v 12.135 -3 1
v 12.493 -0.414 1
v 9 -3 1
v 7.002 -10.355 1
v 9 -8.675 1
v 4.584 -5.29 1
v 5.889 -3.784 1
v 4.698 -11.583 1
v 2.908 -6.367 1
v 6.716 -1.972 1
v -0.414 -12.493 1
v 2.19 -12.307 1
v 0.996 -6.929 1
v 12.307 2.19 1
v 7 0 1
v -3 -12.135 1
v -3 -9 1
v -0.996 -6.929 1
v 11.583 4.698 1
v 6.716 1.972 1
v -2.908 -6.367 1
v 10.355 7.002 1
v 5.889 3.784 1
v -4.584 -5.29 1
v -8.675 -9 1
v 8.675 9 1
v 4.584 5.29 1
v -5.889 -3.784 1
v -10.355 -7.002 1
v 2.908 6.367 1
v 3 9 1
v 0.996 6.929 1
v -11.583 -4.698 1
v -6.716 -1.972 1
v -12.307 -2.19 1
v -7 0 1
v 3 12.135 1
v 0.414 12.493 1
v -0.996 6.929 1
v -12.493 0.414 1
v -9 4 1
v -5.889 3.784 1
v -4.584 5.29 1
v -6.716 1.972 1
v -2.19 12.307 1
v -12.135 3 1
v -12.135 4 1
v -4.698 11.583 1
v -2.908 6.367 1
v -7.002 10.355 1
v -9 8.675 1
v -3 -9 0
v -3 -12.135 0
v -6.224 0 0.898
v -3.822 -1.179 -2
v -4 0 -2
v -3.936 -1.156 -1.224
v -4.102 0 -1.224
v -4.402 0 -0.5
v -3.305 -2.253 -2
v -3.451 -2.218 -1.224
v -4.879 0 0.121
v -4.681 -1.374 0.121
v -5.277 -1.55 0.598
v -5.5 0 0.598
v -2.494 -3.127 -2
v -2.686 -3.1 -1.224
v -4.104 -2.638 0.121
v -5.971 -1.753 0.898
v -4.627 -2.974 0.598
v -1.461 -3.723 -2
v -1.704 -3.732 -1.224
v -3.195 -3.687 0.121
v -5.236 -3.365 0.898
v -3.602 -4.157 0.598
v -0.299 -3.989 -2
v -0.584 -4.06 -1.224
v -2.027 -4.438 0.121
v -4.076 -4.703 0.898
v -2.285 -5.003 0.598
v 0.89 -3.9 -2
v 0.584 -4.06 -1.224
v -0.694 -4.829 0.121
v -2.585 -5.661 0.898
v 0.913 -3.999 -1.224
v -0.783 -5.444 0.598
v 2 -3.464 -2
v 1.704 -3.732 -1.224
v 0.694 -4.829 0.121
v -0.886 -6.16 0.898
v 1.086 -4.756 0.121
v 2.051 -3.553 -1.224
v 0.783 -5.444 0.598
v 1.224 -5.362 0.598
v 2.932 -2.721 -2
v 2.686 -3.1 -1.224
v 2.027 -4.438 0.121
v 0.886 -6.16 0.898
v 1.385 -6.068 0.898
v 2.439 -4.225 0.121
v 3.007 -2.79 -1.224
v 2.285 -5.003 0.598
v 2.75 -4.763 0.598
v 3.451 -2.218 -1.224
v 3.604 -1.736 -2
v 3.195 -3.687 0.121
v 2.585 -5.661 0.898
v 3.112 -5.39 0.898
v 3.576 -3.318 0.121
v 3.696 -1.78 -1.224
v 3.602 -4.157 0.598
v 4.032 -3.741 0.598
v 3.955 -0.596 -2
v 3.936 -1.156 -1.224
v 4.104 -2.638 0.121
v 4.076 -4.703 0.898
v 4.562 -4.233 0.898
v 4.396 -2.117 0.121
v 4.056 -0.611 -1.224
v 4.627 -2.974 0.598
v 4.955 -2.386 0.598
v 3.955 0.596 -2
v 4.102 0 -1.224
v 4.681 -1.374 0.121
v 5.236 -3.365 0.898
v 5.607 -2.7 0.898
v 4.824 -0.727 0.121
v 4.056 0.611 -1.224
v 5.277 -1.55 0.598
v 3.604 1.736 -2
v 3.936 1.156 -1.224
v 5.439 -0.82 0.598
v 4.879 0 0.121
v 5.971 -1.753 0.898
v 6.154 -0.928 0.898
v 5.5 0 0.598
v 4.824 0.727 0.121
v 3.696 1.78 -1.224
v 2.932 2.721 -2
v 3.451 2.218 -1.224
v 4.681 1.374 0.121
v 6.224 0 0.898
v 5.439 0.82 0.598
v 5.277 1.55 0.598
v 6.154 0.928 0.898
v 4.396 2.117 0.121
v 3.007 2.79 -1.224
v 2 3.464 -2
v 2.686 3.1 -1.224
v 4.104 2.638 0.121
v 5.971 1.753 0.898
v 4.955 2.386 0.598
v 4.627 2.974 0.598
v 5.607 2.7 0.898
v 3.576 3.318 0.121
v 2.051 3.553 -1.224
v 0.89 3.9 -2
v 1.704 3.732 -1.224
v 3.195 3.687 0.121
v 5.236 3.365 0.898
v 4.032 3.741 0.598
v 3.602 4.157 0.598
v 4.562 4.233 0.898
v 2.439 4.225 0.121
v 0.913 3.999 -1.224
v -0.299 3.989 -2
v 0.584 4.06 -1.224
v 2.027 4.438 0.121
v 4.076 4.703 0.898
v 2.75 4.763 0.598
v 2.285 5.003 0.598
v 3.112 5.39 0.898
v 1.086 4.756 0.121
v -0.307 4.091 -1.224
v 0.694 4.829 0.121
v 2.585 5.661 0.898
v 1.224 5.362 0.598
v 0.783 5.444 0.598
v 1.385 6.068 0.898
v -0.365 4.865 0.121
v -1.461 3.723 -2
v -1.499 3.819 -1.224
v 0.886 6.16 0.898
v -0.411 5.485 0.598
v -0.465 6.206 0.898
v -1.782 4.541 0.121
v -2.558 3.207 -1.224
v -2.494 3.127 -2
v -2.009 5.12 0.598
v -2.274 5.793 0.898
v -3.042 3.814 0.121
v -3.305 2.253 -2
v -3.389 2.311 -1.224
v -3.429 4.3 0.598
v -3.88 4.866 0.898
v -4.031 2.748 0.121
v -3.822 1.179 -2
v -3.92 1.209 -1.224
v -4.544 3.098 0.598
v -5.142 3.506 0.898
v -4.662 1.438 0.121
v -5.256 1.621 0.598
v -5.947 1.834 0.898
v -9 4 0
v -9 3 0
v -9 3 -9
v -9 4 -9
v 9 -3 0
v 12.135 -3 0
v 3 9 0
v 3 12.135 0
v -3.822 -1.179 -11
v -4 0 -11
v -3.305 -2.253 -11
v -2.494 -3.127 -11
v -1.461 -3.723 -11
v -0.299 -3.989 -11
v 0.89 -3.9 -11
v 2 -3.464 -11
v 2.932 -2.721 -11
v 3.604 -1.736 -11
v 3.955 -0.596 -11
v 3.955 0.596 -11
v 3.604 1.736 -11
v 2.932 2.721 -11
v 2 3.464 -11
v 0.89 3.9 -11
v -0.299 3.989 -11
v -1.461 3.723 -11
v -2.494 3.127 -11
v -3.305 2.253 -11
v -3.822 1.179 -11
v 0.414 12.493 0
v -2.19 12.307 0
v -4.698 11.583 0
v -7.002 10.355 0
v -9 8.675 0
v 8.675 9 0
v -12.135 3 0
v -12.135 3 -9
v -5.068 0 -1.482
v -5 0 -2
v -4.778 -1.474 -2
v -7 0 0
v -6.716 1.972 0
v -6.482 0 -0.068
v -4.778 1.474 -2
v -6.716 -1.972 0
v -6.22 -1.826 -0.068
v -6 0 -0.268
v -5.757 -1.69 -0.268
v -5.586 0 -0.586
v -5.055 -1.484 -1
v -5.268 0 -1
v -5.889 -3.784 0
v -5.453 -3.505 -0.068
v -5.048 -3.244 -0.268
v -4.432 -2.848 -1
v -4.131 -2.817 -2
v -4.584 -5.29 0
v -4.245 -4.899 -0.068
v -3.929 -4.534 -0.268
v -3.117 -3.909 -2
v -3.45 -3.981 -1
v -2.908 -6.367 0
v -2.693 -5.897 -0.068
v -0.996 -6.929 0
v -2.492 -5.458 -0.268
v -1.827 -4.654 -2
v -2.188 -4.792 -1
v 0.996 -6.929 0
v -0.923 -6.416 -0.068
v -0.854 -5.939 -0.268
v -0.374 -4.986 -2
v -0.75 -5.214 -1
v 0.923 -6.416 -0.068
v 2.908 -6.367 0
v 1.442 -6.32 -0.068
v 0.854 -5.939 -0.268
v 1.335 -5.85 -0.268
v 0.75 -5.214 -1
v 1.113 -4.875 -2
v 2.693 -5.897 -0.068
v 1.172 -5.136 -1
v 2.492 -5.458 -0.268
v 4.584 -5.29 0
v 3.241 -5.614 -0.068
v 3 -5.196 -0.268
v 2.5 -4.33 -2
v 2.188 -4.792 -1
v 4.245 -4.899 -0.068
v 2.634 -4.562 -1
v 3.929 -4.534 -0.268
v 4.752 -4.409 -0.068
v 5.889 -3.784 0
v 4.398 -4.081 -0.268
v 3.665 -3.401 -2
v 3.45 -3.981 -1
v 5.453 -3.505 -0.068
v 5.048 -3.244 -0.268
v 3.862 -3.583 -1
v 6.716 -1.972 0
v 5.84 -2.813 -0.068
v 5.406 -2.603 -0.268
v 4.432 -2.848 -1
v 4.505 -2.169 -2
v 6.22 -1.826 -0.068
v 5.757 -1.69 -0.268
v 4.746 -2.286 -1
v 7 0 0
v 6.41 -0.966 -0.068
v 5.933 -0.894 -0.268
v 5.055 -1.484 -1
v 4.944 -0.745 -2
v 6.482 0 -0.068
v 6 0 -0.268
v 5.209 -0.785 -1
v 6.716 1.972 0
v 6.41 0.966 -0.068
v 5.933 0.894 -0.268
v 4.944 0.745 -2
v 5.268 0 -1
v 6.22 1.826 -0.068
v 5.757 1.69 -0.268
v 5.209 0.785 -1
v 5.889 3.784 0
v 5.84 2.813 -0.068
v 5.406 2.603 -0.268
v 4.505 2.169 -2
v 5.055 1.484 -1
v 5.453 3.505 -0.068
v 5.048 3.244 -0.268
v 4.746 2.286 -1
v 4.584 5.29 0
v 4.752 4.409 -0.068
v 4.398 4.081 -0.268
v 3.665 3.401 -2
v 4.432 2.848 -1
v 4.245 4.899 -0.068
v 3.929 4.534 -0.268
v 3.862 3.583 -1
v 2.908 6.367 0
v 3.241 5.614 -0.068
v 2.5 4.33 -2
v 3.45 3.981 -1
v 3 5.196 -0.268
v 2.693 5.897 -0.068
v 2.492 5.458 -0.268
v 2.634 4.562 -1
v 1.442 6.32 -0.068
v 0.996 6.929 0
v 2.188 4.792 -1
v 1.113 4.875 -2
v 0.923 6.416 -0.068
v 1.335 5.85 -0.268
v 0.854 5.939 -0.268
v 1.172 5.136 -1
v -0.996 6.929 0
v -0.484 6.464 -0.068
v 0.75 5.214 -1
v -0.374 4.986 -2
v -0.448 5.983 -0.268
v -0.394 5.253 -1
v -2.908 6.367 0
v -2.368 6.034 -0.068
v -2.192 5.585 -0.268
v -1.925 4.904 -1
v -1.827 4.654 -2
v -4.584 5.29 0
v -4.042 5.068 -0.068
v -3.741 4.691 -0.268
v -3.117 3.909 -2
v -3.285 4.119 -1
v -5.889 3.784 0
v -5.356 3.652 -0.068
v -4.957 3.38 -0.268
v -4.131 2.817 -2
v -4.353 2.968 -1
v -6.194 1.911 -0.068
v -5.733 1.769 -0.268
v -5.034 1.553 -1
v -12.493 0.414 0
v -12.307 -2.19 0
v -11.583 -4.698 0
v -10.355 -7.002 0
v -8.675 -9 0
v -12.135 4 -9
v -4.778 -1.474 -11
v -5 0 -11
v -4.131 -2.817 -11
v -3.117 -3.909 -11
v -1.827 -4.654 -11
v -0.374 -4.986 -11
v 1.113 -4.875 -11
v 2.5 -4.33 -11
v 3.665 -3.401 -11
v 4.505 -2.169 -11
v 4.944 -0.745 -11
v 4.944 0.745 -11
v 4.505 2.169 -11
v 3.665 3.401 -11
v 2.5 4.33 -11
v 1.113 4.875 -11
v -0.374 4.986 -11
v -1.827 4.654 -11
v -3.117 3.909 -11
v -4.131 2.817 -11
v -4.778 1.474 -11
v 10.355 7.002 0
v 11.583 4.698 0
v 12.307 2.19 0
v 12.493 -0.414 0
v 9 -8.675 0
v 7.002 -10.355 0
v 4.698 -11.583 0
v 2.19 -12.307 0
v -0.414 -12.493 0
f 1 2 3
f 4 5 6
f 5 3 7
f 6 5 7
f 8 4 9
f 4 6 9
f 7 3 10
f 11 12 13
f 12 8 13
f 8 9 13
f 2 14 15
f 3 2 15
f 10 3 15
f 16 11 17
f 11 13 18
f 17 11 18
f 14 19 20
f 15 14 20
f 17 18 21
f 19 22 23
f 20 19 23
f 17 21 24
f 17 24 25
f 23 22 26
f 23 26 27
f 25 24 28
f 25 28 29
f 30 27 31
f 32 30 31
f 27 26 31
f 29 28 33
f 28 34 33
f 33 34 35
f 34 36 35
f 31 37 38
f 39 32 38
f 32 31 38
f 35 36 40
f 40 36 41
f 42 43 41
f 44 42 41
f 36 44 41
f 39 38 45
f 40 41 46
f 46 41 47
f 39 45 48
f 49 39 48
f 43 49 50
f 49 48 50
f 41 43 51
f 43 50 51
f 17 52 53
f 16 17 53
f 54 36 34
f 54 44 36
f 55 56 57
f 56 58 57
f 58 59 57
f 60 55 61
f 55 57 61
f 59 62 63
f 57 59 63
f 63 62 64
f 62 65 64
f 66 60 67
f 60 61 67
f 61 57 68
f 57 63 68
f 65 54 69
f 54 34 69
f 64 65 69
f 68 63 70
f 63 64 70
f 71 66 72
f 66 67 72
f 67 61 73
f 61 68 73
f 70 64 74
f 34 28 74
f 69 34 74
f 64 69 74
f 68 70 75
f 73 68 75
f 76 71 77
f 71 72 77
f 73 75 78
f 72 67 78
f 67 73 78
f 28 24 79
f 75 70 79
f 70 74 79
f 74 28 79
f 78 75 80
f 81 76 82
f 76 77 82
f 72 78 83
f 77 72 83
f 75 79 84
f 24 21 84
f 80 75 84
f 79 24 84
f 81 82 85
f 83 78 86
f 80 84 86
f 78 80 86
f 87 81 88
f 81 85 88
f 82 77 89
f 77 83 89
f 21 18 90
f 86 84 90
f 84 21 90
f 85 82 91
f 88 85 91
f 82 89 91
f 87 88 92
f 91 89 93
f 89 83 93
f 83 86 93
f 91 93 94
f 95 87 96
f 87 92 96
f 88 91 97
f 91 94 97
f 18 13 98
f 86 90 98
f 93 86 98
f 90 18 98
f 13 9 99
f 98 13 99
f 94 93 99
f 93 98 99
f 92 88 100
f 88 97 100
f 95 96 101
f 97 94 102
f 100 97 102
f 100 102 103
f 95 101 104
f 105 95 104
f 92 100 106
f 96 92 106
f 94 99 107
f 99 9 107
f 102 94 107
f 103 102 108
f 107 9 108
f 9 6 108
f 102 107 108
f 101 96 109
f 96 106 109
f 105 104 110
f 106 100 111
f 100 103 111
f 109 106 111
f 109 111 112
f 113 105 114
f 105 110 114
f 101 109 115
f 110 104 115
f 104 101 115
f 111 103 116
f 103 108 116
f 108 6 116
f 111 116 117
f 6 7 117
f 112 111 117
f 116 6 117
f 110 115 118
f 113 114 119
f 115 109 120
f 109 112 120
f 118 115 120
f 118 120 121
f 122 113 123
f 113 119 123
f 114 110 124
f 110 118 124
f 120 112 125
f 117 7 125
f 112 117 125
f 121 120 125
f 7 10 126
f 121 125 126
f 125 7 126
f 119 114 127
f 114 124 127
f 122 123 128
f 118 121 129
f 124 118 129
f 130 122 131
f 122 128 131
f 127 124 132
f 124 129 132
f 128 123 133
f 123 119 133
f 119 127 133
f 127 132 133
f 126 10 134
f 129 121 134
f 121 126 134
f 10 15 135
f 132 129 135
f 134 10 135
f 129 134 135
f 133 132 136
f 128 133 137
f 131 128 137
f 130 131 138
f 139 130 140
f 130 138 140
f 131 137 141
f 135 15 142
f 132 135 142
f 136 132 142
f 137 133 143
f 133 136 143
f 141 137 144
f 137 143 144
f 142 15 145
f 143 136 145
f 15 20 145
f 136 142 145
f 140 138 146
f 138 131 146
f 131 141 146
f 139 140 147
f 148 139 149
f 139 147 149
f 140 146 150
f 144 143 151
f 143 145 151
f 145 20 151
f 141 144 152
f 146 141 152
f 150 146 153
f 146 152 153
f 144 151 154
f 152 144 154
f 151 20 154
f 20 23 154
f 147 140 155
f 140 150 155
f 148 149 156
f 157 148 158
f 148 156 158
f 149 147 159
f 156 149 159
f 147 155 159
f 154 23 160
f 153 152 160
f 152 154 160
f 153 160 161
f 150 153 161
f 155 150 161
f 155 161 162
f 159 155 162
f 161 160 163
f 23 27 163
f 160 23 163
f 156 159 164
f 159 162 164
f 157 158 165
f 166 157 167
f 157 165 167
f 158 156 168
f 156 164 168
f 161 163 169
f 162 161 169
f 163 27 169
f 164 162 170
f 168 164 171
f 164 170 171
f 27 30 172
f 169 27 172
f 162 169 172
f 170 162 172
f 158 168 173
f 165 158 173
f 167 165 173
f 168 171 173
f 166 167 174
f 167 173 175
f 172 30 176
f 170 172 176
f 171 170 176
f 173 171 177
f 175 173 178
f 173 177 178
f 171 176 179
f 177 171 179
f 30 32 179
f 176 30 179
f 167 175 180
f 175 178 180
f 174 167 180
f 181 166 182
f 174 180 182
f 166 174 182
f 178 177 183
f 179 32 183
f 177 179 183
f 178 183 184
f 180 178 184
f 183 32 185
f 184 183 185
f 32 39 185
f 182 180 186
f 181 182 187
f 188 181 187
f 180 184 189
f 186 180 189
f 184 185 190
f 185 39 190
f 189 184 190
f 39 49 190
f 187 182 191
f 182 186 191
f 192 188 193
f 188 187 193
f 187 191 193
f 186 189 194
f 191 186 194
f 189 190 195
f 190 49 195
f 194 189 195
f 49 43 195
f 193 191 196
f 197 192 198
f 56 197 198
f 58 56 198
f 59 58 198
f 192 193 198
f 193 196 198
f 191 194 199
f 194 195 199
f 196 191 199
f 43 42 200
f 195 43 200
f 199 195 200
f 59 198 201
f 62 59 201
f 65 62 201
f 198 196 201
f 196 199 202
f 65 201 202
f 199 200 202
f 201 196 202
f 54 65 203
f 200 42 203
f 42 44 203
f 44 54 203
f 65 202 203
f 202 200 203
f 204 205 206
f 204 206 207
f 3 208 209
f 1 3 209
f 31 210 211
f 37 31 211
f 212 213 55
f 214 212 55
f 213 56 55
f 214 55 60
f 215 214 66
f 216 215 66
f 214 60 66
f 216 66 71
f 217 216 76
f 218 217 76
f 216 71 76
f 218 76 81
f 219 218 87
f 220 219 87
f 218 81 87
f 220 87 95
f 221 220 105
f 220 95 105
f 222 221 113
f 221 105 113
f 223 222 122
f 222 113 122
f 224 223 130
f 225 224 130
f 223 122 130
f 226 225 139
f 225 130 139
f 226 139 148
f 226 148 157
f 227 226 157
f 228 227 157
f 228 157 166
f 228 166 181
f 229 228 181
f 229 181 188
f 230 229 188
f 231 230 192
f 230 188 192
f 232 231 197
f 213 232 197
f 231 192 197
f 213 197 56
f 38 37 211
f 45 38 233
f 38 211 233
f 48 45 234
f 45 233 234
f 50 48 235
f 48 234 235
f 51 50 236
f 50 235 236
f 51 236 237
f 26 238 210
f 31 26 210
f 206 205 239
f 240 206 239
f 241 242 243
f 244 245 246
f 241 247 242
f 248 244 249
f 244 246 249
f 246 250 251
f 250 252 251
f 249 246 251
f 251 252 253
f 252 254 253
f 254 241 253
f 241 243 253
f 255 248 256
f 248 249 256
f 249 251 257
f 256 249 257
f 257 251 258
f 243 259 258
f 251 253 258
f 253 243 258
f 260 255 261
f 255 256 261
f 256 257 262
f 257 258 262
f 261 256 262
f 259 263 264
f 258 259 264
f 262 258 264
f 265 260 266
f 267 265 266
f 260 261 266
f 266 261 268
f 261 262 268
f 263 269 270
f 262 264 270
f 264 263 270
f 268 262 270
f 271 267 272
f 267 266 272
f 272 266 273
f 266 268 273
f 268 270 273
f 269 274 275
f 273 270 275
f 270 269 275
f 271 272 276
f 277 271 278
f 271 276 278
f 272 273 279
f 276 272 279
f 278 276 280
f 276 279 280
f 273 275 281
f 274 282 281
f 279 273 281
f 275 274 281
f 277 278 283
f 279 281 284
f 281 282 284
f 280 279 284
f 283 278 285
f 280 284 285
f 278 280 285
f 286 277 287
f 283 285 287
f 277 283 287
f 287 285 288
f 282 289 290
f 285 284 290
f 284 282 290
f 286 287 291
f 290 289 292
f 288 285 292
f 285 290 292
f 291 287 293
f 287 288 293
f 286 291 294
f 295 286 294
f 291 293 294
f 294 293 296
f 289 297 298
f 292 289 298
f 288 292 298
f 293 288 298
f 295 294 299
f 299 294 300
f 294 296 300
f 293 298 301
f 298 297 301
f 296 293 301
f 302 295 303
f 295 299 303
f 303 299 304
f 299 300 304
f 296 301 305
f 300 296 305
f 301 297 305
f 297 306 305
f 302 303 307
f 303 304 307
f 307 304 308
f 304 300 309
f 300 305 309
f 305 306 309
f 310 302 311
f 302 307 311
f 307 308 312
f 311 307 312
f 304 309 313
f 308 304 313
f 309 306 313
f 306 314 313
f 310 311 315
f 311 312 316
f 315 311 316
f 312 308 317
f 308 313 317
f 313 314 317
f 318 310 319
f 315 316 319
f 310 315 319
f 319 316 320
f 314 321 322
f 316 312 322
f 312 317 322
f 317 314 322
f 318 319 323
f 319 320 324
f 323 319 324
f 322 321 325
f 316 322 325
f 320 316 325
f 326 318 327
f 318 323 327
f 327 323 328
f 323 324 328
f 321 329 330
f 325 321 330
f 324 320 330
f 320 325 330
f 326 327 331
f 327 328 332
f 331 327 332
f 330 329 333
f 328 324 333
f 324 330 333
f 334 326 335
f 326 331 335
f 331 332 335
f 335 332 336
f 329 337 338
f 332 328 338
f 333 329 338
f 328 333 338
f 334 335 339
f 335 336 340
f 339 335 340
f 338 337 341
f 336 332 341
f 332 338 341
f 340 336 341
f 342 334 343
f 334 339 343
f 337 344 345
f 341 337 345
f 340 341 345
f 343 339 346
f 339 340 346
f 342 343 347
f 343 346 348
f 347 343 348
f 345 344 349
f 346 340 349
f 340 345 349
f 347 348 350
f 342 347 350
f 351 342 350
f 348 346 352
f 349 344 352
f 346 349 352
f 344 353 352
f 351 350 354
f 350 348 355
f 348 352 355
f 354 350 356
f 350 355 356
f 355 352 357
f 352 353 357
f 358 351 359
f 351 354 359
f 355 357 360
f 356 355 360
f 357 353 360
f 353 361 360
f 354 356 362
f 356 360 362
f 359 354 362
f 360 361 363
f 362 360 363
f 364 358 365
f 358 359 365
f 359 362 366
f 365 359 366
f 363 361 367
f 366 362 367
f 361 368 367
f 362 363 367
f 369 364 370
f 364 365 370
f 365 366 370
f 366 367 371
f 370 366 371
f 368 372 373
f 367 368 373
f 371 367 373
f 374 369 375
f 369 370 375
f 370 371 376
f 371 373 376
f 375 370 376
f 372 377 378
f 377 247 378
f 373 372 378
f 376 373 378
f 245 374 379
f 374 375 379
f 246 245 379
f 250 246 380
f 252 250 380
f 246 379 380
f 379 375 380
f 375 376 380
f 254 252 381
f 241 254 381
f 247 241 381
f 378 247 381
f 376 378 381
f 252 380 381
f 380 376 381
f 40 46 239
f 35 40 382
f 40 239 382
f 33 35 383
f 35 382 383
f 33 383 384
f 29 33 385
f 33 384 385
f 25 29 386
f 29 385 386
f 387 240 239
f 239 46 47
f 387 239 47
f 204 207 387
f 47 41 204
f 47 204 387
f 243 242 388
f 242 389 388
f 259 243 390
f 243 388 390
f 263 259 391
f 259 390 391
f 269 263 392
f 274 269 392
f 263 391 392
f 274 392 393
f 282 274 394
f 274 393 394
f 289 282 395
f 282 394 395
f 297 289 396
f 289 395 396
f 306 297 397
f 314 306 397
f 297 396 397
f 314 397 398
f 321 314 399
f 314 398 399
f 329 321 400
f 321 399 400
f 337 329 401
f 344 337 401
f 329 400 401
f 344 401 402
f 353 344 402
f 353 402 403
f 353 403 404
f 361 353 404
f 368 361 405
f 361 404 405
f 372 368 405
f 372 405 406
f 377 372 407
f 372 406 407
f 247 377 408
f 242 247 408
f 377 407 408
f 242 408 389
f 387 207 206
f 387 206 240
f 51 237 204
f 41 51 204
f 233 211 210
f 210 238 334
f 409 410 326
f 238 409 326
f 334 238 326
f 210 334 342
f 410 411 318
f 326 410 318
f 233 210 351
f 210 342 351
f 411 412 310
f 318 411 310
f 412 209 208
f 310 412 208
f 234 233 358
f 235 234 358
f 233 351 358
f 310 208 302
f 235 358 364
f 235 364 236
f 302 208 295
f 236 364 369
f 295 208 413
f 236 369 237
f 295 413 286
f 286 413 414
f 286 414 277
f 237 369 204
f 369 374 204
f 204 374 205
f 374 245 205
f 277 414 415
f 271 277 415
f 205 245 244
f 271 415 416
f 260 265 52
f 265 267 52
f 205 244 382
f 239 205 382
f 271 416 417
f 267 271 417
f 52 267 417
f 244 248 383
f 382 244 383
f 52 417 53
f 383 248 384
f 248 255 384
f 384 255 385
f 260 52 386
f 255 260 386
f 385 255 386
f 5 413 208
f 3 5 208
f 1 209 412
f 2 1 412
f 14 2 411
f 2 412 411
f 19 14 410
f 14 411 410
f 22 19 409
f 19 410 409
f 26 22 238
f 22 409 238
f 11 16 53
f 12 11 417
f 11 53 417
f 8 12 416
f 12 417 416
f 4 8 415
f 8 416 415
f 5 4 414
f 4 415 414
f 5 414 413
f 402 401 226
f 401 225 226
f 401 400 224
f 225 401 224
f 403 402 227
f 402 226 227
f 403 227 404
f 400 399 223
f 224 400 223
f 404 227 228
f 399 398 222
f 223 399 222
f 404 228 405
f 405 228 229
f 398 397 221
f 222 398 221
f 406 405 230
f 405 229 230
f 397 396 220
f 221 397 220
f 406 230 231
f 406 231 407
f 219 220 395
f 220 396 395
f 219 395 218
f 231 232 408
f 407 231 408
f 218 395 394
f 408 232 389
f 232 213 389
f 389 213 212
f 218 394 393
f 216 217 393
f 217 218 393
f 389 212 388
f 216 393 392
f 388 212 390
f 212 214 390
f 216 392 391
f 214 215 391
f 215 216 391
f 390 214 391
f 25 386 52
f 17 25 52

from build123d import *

# Parameters (mm, degrees)
CUT_EXTRUDE1_DEPTH       = 10
BOSS_EXTRUDE1_DEPTH      = 9
BOSS_EXTRUDE1_DEPTH_BACK = 1
SKETCH4_W                = 3.1346611
SKETCH4_H                = 1


with BuildPart() as part:
    # Sketch2 → Revolve1 (revolve)
    with BuildSketch(Plane(origin=(0, 0, 0), x_dir=(1, 0, 0), z_dir=(0, 1, 0)), mode=Mode.PRIVATE) as revolve1_sk:
        with BuildLine():
            Line((4, 11), (4, 2))
            ThreePointArc((4, 2), (4.878679656, -0.121320344), (7, -1))
            Line((7, -1), (12.5, -1))
            Line((12.5, -1), (12.5, 0))
            Line((12.5, 0), (7, 0))
            ThreePointArc((7, 0), (5.585786438, 0.585786438), (5, 2))
            Line((5, 2), (5, 11))
            Line((5, 11), (4, 11))
        make_face()
    revolve(revolve1_sk.sketch.rotate(Axis((0, 0, -90.408402744), (0, 0, 1)), 180), axis=Axis((0, 0, -90.408402744), (0, 0, 1)))

    # Sketch3 → Cut-Extrude1 (cut)
    with BuildSketch(Plane(origin=(0, 0, 0), x_dir=(-1, 0, 0), z_dir=(0, 0, -1))):
        with BuildLine():
            Line((9, 8.674675786), (9, 3))
            Line((9, 3), (12.1346611, 3))
            ThreePointArc((12.1346611, 3), (10.941616026, 6.044091225), (9, 8.674675786))
        make_face()
        with BuildLine():
            Line((8.674675786, -9), (3, -9))
            Line((3, -9), (3, -12.1346611))
            ThreePointArc((3, -12.1346611), (6.044091225, -10.941616026), (8.674675786, -9))
        make_face()
        with BuildLine():
            Line((-9, -8.674675786), (-9, -3))
            Line((-9, -3), (-12.1346611, -3))
            ThreePointArc((-12.1346611, -3), (-10.941616026, -6.044091225), (-9, -8.674675786))
        make_face()
        with BuildLine():
            Line((-8.674675786, 9), (-3, 9))
            Line((-3, 9), (-3, 12.1346611))
            ThreePointArc((-3, 12.1346611), (-6.044091225, 10.941616026), (-8.674675786, 9))
        make_face()
    extrude(amount=-CUT_EXTRUDE1_DEPTH, mode=Mode.SUBTRACT)

    # Sketch4 → Boss-Extrude1 (add, two sides: drawn at the far end of the back side and taken through both)
    with BuildSketch(Plane(origin=(0, 0, 0), x_dir=(-1, 0, 0), z_dir=(0, 0, -1)).offset(-BOSS_EXTRUDE1_DEPTH_BACK)):
        with Locations((10.56733055, 3.5)):
            Rectangle(SKETCH4_W, SKETCH4_H)
    extrude(amount=BOSS_EXTRUDE1_DEPTH + BOSS_EXTRUDE1_DEPTH_BACK)


solid = part.part
